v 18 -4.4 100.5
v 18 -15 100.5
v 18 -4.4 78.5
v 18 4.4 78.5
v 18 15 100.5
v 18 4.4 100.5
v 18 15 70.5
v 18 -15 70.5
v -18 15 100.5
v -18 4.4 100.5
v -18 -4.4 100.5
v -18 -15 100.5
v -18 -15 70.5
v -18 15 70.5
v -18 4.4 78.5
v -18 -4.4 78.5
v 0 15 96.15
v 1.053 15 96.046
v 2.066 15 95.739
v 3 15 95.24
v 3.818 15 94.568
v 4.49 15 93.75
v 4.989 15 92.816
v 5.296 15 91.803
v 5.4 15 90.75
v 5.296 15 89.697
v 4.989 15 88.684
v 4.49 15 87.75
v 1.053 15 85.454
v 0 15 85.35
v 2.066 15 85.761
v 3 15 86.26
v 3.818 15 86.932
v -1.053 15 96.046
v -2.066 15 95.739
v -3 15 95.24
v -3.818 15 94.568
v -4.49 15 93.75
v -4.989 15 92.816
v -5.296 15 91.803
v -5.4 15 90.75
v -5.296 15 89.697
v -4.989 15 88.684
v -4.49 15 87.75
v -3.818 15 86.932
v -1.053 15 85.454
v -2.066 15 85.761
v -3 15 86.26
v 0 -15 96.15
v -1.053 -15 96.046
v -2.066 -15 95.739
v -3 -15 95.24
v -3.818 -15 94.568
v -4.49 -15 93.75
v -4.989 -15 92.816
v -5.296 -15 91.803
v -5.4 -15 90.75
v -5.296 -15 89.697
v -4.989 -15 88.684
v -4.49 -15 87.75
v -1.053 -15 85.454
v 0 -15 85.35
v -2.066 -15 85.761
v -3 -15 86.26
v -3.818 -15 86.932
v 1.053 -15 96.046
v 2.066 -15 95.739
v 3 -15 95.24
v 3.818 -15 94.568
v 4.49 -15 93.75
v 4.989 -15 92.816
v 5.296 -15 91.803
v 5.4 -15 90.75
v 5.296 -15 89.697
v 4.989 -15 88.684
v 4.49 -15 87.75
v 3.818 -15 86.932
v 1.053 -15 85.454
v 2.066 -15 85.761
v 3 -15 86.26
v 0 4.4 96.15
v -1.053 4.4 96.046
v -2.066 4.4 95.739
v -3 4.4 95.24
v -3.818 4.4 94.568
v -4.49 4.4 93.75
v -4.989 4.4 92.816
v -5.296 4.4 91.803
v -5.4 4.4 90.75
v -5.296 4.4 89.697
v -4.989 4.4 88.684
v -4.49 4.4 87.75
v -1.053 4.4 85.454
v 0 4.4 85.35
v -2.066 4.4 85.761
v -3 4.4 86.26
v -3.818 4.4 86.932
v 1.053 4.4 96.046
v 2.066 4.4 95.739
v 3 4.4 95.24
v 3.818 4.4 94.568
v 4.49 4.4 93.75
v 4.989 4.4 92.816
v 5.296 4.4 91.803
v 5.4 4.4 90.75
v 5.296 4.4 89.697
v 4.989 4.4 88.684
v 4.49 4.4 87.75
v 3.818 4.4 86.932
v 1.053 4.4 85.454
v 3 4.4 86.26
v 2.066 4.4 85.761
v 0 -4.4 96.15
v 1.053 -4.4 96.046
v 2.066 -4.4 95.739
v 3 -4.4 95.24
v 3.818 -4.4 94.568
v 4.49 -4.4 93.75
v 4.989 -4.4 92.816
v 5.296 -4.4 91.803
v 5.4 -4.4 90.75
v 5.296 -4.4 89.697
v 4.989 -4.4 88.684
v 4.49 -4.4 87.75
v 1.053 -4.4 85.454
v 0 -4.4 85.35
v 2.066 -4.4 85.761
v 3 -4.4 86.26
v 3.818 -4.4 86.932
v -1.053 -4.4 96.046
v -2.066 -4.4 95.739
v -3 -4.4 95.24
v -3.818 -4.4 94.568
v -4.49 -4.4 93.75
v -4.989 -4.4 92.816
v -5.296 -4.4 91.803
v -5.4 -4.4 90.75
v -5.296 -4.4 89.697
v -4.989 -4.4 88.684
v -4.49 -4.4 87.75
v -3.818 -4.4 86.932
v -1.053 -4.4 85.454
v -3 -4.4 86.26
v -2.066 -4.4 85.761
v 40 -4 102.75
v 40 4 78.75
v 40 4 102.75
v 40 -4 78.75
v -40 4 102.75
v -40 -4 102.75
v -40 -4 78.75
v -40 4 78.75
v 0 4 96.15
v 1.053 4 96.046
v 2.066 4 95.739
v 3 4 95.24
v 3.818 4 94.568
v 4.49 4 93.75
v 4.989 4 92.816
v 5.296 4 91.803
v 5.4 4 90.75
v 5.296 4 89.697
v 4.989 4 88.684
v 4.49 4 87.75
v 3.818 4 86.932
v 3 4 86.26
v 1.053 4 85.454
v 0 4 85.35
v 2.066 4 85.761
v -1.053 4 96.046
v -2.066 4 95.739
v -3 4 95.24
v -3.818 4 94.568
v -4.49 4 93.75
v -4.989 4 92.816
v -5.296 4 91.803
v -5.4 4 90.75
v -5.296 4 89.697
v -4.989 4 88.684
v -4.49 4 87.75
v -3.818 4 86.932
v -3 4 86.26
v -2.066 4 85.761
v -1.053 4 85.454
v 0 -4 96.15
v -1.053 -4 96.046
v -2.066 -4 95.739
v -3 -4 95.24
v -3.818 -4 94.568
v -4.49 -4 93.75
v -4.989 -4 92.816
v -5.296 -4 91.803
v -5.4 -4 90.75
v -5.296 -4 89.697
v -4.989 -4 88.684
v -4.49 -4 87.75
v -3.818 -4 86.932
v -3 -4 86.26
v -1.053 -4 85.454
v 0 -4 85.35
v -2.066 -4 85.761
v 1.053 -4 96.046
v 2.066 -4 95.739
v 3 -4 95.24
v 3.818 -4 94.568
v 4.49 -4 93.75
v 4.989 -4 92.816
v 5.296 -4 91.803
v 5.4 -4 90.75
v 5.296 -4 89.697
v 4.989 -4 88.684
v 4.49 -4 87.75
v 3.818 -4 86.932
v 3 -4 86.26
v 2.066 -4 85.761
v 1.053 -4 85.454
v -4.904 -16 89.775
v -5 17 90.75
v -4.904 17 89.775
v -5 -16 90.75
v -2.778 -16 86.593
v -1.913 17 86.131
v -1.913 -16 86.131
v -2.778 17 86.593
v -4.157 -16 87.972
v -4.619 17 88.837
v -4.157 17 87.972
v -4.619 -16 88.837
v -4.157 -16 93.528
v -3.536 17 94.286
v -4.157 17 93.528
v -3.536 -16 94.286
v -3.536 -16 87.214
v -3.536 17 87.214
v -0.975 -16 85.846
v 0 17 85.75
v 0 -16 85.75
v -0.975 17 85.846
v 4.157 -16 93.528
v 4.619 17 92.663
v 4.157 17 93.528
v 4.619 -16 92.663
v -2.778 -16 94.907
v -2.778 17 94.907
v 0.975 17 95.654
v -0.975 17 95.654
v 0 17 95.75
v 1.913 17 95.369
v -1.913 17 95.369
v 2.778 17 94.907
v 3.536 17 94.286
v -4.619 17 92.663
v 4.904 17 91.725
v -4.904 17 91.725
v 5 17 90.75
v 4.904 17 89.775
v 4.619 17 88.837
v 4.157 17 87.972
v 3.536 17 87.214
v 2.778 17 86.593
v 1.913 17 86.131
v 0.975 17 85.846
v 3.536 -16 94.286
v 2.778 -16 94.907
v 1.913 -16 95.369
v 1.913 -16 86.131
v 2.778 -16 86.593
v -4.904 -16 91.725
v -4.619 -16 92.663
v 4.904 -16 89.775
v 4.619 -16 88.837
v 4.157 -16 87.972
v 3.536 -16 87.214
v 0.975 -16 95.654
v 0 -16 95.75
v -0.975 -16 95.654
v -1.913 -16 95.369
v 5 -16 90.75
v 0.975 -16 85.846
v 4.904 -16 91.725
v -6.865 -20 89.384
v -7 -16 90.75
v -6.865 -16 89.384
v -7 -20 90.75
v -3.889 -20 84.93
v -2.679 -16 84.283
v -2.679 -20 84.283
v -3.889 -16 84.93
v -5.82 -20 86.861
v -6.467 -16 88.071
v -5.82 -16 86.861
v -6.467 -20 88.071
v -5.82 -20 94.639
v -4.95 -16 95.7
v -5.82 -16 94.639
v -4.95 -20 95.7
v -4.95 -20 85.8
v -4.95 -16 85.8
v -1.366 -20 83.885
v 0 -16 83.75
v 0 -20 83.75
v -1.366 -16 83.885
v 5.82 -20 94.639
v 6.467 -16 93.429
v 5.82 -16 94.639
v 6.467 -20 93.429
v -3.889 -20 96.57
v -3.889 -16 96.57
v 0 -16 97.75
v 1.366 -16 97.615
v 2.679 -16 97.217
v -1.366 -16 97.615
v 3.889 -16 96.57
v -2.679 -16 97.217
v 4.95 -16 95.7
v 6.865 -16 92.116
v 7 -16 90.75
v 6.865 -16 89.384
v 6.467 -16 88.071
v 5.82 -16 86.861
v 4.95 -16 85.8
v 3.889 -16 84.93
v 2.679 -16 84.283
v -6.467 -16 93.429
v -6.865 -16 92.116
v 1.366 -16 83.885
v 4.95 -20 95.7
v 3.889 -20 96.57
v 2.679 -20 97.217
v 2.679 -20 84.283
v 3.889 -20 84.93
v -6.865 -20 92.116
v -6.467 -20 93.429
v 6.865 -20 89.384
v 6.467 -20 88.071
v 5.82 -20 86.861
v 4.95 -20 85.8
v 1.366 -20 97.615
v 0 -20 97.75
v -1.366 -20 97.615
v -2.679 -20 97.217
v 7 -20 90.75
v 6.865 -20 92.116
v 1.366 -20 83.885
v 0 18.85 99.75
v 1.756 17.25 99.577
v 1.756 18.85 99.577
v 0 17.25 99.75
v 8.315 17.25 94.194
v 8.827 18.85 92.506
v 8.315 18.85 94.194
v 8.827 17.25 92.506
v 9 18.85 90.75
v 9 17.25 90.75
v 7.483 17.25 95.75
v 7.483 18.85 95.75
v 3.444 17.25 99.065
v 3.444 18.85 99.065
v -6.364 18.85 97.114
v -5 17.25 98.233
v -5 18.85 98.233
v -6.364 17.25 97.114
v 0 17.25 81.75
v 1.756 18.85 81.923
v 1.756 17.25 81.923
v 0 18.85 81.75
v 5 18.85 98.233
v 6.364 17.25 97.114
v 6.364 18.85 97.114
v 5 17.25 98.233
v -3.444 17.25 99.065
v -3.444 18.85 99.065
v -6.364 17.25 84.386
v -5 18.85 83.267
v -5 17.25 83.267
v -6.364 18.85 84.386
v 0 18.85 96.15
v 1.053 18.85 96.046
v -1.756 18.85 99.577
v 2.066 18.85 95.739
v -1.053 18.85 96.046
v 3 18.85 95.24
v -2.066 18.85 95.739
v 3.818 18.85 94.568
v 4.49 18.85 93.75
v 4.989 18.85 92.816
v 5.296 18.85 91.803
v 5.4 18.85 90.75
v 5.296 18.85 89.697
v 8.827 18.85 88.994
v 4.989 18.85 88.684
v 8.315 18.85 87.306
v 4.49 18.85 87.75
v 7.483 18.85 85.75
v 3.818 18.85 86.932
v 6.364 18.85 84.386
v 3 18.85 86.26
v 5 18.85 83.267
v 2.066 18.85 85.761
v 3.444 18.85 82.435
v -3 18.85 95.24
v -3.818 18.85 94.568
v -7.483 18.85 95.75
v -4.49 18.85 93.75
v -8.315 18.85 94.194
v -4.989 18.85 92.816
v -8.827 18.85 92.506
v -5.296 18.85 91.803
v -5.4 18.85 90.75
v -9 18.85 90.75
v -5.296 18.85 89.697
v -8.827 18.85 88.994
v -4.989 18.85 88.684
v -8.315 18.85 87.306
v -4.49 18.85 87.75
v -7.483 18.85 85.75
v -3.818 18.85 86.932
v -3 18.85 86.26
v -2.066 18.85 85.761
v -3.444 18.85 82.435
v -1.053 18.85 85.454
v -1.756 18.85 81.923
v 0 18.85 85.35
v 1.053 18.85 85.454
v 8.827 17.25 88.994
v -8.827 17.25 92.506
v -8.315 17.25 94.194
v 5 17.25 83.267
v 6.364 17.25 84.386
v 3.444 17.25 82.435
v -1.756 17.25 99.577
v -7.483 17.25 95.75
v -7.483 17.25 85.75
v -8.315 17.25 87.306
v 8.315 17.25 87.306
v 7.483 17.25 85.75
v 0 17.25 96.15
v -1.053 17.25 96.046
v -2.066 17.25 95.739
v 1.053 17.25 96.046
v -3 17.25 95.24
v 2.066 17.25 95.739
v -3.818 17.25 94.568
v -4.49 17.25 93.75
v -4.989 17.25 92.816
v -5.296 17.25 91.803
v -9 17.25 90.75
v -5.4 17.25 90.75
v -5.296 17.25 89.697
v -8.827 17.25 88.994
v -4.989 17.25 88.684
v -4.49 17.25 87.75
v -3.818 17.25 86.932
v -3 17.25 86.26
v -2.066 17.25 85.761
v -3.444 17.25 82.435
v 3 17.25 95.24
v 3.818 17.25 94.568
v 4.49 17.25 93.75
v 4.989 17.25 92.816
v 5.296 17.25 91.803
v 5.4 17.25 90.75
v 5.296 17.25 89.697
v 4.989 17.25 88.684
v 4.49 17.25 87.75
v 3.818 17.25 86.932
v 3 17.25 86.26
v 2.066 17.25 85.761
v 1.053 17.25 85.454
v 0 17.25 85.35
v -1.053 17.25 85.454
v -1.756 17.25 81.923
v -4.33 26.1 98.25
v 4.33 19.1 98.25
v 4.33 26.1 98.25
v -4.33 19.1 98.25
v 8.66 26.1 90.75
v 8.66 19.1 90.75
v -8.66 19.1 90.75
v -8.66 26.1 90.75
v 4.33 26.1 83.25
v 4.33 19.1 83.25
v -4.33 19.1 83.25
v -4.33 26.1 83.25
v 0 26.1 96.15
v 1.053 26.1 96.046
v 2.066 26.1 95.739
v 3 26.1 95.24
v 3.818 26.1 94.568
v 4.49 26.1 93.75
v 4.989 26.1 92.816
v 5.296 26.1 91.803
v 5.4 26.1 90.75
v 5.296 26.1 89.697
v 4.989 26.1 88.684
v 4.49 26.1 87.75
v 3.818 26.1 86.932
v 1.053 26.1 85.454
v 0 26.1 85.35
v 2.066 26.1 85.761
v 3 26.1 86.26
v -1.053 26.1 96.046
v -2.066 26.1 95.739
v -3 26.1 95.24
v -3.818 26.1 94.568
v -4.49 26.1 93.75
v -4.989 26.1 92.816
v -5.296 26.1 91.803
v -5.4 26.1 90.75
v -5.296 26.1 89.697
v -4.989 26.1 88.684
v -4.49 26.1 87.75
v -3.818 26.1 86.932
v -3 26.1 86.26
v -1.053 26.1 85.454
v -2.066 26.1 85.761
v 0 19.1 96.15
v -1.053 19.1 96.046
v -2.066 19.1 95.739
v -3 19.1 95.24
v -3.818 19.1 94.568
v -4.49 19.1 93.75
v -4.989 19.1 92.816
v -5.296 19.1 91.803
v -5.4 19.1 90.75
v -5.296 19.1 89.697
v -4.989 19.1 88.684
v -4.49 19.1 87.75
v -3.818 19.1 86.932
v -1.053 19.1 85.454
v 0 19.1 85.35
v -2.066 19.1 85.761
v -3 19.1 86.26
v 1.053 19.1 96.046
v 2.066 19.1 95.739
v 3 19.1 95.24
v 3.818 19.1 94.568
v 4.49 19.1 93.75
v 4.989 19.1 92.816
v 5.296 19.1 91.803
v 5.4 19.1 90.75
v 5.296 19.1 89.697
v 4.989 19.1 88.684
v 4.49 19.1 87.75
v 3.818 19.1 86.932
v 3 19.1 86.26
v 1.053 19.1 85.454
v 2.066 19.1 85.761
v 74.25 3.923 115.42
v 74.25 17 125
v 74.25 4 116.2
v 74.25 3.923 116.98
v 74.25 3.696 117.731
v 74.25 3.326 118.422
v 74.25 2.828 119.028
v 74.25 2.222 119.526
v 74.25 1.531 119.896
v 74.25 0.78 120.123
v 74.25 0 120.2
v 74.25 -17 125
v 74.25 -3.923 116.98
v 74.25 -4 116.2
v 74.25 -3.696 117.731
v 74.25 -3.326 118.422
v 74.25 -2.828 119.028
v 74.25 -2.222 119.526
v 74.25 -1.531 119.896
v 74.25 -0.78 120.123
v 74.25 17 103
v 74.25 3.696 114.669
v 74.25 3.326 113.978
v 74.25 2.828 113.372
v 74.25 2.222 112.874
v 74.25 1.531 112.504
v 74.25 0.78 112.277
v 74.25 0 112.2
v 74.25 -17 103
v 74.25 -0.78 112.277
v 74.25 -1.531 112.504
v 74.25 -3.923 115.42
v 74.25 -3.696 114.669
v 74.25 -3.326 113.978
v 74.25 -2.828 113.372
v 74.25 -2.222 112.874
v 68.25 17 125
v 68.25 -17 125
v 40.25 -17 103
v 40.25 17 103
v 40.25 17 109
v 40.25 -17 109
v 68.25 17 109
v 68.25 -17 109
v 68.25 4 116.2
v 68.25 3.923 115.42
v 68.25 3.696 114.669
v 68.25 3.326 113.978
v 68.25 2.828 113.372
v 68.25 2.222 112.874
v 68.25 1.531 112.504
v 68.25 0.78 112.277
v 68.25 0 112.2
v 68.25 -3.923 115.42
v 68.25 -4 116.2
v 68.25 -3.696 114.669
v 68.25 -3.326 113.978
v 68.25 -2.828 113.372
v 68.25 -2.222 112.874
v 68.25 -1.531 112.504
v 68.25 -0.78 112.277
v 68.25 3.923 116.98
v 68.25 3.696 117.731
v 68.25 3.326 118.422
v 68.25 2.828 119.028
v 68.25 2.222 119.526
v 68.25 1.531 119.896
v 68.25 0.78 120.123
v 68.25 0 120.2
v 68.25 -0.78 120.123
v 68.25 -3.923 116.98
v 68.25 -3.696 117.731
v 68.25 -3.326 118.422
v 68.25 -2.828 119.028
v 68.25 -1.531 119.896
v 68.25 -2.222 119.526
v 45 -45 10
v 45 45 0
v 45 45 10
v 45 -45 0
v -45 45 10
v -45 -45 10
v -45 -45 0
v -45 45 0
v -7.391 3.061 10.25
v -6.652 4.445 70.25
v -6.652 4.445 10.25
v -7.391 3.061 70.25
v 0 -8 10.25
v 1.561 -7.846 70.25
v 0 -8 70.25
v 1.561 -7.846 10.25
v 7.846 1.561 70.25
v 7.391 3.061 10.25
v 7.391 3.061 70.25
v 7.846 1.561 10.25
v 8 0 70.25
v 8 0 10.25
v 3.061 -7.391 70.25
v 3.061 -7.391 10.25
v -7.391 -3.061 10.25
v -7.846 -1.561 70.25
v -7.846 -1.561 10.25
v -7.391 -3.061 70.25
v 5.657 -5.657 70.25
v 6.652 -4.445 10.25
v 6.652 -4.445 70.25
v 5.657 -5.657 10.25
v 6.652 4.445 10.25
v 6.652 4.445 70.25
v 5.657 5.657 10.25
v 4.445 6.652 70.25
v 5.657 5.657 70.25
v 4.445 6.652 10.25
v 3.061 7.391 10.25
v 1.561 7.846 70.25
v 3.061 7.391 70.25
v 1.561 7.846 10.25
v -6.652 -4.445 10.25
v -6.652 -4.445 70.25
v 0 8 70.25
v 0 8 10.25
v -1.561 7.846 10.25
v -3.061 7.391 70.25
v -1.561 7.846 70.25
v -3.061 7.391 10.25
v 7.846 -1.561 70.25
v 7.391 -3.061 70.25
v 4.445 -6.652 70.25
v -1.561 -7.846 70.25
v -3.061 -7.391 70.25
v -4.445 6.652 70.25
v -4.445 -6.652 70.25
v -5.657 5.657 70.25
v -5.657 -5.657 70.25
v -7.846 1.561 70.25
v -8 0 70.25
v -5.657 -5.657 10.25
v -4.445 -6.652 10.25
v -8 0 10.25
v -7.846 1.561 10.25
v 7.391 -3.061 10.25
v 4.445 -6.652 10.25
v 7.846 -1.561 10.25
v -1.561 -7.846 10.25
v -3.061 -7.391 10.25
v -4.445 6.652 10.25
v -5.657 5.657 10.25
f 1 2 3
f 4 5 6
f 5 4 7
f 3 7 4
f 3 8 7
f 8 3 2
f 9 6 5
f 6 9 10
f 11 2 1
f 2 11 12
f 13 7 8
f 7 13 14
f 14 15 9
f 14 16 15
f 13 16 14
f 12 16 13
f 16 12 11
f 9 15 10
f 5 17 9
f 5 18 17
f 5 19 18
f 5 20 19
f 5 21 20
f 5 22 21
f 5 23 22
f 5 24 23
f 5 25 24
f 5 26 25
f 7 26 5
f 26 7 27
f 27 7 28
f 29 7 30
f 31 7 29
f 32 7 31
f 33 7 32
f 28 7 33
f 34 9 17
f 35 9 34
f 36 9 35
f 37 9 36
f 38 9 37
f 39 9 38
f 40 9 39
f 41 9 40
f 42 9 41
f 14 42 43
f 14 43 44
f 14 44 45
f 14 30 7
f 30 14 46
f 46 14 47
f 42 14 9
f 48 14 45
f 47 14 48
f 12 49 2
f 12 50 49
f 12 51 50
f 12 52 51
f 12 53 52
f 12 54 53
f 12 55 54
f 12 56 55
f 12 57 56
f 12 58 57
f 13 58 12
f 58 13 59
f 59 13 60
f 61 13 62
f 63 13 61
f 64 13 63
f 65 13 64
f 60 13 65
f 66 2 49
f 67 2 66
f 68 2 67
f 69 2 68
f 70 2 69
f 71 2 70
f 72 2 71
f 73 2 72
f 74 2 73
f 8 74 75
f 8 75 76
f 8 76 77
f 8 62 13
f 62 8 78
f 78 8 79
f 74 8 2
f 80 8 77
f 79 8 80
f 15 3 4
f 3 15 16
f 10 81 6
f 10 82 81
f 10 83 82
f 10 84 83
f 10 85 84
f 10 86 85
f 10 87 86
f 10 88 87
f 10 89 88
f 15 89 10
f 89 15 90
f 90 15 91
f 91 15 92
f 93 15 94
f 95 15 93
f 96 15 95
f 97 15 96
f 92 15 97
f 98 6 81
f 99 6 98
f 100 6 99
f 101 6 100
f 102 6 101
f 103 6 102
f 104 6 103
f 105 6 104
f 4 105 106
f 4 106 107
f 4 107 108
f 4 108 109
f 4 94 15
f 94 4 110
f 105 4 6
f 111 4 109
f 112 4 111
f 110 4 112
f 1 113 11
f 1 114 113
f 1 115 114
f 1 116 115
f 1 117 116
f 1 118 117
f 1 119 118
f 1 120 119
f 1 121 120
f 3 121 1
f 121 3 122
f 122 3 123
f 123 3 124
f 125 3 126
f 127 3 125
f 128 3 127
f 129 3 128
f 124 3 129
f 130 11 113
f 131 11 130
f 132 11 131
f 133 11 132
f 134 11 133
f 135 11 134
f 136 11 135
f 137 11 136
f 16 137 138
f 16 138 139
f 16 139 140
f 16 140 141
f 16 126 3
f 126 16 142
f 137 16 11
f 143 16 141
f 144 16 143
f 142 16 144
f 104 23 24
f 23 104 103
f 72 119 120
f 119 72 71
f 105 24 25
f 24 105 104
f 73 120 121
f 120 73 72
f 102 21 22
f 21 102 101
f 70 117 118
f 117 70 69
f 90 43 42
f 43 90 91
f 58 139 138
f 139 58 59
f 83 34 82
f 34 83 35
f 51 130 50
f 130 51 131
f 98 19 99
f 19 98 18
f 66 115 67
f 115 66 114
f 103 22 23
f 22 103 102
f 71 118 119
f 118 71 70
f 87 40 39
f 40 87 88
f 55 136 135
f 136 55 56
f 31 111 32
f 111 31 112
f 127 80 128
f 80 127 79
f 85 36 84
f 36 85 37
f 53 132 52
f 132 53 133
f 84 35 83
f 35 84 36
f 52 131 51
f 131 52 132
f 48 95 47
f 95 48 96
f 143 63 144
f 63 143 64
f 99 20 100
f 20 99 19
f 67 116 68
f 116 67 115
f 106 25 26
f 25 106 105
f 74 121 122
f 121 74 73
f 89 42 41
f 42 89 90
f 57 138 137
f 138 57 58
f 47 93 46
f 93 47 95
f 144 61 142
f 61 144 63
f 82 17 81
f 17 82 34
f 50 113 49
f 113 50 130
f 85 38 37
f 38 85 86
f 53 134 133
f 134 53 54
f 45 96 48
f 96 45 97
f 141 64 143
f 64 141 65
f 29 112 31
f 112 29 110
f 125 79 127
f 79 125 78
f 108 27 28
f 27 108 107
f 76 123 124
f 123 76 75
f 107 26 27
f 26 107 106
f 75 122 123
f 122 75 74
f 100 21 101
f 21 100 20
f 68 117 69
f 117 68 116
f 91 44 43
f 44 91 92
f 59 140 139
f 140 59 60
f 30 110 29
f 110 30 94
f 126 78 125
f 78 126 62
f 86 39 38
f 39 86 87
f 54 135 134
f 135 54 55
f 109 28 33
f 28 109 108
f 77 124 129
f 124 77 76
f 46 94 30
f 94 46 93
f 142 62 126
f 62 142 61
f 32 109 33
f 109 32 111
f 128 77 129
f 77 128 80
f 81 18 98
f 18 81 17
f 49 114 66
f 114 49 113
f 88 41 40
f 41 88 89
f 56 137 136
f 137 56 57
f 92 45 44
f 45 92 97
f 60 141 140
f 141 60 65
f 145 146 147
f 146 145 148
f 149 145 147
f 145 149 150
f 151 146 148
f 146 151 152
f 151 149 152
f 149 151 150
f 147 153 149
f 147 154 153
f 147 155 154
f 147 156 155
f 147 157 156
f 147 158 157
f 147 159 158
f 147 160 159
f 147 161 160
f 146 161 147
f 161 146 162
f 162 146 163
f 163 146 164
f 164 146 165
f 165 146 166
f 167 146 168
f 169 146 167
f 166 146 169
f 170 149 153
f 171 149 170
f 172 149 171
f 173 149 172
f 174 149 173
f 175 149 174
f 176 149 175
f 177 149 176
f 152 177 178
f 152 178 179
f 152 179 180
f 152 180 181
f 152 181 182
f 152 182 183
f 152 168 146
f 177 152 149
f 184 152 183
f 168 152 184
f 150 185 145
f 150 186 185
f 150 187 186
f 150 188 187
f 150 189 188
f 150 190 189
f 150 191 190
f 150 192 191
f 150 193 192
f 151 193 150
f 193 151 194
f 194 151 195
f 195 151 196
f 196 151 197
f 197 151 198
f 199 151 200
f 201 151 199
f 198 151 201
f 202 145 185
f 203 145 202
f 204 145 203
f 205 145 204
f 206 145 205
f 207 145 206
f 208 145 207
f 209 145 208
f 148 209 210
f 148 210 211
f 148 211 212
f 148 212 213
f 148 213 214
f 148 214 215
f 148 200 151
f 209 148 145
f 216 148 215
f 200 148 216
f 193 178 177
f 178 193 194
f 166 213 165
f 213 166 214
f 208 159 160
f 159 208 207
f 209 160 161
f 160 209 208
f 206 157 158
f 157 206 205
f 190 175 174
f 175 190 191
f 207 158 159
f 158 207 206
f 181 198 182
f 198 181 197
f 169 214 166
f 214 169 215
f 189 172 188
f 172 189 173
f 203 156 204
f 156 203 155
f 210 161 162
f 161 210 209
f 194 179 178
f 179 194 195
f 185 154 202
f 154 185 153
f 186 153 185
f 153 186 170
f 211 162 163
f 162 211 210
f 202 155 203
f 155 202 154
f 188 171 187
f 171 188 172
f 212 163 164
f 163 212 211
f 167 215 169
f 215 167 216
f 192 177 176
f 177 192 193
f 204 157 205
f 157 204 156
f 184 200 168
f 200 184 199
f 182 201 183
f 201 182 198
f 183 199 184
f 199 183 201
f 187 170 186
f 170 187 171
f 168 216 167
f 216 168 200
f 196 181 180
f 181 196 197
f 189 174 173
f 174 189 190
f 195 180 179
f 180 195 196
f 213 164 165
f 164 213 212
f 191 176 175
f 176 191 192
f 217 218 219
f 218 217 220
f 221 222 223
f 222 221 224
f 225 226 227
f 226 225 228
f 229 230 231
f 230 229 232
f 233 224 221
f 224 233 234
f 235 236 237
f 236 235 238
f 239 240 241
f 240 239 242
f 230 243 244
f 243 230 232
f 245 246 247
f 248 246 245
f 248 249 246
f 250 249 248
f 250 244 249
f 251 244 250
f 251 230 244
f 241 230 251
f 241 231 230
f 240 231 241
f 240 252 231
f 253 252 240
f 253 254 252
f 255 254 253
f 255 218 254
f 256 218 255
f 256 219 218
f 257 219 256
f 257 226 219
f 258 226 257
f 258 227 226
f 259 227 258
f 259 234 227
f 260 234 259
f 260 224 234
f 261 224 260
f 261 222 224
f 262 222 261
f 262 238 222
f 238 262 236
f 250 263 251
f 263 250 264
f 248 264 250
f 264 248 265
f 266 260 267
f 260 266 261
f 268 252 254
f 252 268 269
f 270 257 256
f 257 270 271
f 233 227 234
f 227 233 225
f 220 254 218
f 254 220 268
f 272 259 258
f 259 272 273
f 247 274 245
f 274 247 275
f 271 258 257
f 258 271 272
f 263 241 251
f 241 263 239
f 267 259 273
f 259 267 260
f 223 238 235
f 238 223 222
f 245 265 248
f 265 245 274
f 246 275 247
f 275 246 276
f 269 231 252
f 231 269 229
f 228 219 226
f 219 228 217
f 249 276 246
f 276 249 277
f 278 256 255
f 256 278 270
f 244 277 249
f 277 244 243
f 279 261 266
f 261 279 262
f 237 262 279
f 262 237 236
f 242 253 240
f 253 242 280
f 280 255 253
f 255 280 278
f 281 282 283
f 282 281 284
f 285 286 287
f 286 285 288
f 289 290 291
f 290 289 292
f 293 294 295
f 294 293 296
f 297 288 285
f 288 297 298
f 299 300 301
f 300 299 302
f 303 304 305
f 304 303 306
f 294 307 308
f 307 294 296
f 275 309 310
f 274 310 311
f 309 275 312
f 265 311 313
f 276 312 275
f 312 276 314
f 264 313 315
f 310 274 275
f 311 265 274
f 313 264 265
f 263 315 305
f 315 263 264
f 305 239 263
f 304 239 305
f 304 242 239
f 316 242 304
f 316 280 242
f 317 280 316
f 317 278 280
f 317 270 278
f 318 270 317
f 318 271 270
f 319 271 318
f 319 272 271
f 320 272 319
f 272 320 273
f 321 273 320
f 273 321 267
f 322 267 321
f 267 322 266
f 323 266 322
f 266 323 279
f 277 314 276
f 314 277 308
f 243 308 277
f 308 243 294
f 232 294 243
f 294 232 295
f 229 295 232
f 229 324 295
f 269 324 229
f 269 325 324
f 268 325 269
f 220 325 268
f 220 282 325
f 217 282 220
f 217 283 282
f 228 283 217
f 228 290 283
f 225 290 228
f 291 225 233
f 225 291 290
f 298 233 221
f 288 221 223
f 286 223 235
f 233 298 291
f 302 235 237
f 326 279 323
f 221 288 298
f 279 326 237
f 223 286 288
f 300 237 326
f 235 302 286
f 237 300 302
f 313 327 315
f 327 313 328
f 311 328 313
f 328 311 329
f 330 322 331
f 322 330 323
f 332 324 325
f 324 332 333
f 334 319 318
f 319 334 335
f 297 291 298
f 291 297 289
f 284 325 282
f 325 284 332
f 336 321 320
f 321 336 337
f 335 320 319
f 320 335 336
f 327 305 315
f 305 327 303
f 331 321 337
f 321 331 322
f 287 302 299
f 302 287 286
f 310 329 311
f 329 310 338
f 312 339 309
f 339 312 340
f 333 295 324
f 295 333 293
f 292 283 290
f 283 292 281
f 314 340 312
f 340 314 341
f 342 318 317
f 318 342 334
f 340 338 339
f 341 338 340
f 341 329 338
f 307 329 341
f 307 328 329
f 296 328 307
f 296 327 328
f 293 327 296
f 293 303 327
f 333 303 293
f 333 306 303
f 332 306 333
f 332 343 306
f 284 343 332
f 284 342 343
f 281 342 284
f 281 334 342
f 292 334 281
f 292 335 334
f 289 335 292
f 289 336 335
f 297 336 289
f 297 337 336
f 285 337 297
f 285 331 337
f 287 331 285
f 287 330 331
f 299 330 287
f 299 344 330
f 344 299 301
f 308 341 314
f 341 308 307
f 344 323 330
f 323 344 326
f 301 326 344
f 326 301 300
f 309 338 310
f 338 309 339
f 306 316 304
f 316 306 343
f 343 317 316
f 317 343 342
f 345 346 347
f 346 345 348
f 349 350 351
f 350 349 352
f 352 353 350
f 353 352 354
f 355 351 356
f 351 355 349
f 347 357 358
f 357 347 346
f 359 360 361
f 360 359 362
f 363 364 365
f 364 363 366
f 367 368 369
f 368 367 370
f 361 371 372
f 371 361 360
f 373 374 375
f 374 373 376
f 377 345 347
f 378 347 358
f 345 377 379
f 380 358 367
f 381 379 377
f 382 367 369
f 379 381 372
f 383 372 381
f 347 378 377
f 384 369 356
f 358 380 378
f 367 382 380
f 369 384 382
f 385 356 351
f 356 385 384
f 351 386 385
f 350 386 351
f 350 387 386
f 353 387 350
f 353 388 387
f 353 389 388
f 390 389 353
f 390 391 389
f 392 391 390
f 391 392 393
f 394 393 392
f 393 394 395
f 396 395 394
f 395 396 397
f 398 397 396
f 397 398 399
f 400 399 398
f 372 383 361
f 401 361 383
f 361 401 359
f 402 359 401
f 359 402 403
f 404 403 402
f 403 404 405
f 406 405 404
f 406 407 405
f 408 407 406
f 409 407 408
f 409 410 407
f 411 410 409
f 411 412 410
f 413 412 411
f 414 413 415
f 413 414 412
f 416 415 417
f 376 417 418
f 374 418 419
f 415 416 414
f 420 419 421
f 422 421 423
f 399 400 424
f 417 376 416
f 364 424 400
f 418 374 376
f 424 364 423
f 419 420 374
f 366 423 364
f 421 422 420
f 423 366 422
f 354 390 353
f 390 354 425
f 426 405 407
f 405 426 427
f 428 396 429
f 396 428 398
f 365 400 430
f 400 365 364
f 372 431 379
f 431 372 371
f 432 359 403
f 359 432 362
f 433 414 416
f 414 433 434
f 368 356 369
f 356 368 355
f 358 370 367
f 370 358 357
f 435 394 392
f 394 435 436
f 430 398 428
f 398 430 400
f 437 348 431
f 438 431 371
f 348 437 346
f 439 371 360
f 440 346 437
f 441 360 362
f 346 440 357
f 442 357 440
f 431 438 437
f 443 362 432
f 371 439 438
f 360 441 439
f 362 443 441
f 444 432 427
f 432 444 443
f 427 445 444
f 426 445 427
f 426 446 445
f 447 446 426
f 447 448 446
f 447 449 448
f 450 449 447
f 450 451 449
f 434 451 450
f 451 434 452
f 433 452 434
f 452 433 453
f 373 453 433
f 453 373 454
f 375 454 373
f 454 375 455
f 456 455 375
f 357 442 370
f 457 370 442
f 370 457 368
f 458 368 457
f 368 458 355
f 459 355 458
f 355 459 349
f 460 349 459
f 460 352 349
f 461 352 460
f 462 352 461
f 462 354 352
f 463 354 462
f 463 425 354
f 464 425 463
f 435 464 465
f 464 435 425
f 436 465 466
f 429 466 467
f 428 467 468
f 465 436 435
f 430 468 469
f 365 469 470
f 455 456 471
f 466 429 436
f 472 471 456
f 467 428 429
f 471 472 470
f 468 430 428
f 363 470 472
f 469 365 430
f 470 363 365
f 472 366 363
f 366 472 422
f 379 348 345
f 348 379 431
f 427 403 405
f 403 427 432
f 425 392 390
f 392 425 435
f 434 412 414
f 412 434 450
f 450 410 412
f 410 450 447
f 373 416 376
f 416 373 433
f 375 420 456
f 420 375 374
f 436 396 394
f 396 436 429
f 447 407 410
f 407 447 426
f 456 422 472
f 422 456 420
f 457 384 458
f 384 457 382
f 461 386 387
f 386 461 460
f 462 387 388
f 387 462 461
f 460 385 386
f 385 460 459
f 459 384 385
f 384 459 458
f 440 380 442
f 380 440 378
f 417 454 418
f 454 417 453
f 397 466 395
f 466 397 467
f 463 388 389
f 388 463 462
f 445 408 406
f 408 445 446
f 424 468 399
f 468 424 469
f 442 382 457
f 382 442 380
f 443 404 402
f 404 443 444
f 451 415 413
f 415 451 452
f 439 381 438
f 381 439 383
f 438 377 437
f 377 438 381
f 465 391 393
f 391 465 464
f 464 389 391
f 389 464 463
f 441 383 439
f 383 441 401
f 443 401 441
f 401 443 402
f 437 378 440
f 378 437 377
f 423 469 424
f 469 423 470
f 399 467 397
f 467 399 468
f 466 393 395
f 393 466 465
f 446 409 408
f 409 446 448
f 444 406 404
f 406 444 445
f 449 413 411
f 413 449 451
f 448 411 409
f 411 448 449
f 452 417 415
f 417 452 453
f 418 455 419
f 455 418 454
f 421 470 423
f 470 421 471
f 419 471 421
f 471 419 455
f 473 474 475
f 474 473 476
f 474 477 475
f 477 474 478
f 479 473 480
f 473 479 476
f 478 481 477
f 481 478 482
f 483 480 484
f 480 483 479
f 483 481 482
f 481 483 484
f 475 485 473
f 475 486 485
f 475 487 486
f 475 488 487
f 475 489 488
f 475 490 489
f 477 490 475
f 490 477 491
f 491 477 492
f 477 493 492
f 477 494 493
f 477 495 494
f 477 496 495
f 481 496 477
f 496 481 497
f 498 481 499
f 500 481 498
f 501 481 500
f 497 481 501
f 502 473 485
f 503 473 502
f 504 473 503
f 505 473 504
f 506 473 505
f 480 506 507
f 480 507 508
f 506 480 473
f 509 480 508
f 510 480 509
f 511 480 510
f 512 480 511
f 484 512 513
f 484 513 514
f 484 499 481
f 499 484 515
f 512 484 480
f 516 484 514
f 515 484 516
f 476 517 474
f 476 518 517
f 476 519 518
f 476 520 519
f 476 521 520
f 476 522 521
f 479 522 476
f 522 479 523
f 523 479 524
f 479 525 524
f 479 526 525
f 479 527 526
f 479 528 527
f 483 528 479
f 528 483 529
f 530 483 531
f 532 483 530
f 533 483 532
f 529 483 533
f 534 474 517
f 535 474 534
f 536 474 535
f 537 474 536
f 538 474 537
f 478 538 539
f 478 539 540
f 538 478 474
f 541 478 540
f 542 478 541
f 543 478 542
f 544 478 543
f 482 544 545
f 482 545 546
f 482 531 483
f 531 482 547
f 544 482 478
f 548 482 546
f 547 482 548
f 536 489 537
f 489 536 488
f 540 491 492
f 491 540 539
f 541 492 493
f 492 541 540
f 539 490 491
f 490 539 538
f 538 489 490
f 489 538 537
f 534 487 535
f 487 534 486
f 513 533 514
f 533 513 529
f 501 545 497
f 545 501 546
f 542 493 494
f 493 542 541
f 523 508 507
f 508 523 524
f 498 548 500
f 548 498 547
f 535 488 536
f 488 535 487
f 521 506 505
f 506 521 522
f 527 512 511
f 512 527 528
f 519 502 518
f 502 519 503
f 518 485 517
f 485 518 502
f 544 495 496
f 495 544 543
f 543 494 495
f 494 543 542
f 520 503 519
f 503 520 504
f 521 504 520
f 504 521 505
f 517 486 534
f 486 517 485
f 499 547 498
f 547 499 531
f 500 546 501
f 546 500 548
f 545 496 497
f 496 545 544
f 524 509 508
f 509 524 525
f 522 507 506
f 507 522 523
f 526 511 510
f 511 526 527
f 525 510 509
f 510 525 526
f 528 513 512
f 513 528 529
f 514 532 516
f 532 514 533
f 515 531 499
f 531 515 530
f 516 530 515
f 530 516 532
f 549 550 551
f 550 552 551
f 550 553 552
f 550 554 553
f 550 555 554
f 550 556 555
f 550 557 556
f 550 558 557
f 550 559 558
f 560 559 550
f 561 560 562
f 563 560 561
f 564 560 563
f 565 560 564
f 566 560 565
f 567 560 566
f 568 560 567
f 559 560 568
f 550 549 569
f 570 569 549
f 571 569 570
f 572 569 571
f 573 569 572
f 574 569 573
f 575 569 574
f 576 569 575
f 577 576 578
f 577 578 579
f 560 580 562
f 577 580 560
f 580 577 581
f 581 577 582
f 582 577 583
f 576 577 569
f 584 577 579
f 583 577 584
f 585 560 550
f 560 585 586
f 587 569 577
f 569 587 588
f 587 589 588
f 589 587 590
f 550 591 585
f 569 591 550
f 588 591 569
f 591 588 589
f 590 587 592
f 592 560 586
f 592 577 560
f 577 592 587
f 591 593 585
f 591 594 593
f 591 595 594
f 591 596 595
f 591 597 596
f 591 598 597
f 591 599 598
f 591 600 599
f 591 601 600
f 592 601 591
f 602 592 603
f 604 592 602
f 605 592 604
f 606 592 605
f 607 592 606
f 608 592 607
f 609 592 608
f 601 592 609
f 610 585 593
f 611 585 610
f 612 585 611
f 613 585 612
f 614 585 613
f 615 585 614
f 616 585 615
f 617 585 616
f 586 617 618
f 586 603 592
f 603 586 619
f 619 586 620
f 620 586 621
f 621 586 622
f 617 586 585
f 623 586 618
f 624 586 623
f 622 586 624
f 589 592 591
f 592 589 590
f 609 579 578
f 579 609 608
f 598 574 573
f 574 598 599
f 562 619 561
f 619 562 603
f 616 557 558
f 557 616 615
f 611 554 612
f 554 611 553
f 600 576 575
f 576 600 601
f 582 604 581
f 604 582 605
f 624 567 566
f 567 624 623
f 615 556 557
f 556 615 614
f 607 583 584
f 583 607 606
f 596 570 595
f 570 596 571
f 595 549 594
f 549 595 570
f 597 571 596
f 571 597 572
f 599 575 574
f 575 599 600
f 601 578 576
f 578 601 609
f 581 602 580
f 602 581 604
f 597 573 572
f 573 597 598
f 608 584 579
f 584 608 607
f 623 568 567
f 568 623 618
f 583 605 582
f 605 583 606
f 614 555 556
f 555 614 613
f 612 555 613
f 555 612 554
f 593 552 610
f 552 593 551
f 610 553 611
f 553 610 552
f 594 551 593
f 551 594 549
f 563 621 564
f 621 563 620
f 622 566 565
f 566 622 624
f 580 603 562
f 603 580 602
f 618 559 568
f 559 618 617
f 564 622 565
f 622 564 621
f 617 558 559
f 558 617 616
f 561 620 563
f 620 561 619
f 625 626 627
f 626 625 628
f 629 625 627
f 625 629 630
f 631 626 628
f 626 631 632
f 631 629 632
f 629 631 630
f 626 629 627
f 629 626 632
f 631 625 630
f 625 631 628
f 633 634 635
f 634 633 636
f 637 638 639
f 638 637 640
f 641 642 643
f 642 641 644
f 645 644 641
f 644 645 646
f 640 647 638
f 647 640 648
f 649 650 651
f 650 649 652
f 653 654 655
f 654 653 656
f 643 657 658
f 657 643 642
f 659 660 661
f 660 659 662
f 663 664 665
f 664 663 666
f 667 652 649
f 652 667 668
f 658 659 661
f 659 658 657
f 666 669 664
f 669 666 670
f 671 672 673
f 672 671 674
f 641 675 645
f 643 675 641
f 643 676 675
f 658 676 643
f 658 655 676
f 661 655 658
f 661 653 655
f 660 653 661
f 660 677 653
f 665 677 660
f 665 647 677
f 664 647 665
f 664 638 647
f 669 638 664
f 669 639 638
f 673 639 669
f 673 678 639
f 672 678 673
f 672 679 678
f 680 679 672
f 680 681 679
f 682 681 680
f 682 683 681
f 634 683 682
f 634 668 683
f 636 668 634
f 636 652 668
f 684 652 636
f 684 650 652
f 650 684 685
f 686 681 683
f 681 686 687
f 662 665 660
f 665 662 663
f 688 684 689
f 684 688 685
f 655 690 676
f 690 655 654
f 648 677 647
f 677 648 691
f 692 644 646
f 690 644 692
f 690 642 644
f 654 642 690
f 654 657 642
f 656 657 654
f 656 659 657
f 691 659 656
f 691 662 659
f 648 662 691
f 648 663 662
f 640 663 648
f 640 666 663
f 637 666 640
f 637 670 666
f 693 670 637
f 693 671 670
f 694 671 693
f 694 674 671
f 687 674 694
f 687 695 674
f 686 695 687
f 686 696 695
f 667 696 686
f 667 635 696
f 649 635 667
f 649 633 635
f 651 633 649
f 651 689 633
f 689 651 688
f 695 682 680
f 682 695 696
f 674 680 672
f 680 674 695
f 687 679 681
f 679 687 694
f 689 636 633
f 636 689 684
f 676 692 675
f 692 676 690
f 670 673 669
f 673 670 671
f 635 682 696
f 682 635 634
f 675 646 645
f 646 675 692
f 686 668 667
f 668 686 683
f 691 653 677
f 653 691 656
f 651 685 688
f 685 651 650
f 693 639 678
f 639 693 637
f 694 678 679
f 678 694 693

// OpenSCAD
$fn = 32;

// ------------------------------------------------------------------------
// Lamp arm: column d16 x 60 mm, arm 80 mm
// Every part is its own module, assembly() places every instance.
// ------------------------------------------------------------------------

// --- part 1 ---
module lamp_base() {
  difference() {
    translate([-45, -45, 0]) cube([90, 90, 10]);
  }
}

// --- part 2 ---
module lamp_column() {
  cylinder(h = 60, d = 16);
}

// --- part 3 ---
module head_fork() {
  difference() {
    translate([-18, -15, 0]) cube([36, 30, 30]);
    translate([-19, -4.4, 8]) cube([38, 8.8, 23]);
    translate([0, 0, 20.25]) rotate([90, 0, 0]) cylinder(h = 32, d = 10.8, center = true);
  }
}

// --- part 4 ---
module lamp_arm() {
  difference() {
    translate([-40, -4, 0]) cube([80, 8, 24]);
    translate([0, 0, 12]) rotate([90, 0, 0]) cylinder(h = 10, d = 10.8, center = true);
  }
}

// --- part 5 ---
module arm_pin() {
  rotate([0, 90, 0]) cylinder(h = 34, d = 10, center = true);
  translate([-20, 0, 0]) rotate([0, 90, 0]) cylinder(h = 4, d = 14);
}

// --- part 6 ---
module arm_washer() {
  difference() {
      translate([0, 0, 0]) cylinder(h = 1.6, d = 18);
      translate([0, 0, -1]) cylinder(h = 3.6, d = 10.8);
    }
}

// --- part 7 ---
module arm_nut() {
  difference() {
    linear_extrude(height = 7) polygon(points = [[8.66, 0], [4.33, 7.5], [-4.33, 7.5], [-8.66, 0], [-4.33, -7.5], [4.33, -7.5]]);
    translate([0, 0, -1]) cylinder(h = 9, d = 10.8);
  }
}

// --- part 8 ---
module shade_bracket() {
  difference() {
    translate([-17, -17, 0]) cube([34, 34, 22]);
    translate([-18, -18, 6]) cube([29, 36, 17]);
    translate([14, 0, 13.2]) rotate([0, 90, 0]) cylinder(h = 8, d = 8, center = true);
  }
}

// --- assembly ---
module assembly() {
  color([0.80, 0.24, 0.20]) translate([0, 0, 0]) rotate([0, 0, 0]) lamp_base();
  color([0.20, 0.45, 0.75]) translate([0, 0, 10.25]) rotate([0, 0, 0]) lamp_column();
  color([0.25, 0.62, 0.32]) translate([0, 0, 70.5]) rotate([0, 0, 0]) head_fork();
  color([0.92, 0.70, 0.18]) translate([0, 0, 78.75]) rotate([0, 0, 0]) lamp_arm();
  color([0.58, 0.35, 0.70]) translate([0, 0, 90.75]) rotate([0, 0, 90]) arm_pin();
  color([0.16, 0.66, 0.66]) translate([0, 18.85, 90.75]) rotate([90, 0, 0]) arm_washer();
  color([0.85, 0.48, 0.18]) translate([0, 26.1, 90.75]) rotate([90, 0, 0]) arm_nut();
  color([0.55, 0.60, 0.65]) translate([57.25, 0, 103]) rotate([0, 0, 0]) shade_bracket();
}

assembly();
